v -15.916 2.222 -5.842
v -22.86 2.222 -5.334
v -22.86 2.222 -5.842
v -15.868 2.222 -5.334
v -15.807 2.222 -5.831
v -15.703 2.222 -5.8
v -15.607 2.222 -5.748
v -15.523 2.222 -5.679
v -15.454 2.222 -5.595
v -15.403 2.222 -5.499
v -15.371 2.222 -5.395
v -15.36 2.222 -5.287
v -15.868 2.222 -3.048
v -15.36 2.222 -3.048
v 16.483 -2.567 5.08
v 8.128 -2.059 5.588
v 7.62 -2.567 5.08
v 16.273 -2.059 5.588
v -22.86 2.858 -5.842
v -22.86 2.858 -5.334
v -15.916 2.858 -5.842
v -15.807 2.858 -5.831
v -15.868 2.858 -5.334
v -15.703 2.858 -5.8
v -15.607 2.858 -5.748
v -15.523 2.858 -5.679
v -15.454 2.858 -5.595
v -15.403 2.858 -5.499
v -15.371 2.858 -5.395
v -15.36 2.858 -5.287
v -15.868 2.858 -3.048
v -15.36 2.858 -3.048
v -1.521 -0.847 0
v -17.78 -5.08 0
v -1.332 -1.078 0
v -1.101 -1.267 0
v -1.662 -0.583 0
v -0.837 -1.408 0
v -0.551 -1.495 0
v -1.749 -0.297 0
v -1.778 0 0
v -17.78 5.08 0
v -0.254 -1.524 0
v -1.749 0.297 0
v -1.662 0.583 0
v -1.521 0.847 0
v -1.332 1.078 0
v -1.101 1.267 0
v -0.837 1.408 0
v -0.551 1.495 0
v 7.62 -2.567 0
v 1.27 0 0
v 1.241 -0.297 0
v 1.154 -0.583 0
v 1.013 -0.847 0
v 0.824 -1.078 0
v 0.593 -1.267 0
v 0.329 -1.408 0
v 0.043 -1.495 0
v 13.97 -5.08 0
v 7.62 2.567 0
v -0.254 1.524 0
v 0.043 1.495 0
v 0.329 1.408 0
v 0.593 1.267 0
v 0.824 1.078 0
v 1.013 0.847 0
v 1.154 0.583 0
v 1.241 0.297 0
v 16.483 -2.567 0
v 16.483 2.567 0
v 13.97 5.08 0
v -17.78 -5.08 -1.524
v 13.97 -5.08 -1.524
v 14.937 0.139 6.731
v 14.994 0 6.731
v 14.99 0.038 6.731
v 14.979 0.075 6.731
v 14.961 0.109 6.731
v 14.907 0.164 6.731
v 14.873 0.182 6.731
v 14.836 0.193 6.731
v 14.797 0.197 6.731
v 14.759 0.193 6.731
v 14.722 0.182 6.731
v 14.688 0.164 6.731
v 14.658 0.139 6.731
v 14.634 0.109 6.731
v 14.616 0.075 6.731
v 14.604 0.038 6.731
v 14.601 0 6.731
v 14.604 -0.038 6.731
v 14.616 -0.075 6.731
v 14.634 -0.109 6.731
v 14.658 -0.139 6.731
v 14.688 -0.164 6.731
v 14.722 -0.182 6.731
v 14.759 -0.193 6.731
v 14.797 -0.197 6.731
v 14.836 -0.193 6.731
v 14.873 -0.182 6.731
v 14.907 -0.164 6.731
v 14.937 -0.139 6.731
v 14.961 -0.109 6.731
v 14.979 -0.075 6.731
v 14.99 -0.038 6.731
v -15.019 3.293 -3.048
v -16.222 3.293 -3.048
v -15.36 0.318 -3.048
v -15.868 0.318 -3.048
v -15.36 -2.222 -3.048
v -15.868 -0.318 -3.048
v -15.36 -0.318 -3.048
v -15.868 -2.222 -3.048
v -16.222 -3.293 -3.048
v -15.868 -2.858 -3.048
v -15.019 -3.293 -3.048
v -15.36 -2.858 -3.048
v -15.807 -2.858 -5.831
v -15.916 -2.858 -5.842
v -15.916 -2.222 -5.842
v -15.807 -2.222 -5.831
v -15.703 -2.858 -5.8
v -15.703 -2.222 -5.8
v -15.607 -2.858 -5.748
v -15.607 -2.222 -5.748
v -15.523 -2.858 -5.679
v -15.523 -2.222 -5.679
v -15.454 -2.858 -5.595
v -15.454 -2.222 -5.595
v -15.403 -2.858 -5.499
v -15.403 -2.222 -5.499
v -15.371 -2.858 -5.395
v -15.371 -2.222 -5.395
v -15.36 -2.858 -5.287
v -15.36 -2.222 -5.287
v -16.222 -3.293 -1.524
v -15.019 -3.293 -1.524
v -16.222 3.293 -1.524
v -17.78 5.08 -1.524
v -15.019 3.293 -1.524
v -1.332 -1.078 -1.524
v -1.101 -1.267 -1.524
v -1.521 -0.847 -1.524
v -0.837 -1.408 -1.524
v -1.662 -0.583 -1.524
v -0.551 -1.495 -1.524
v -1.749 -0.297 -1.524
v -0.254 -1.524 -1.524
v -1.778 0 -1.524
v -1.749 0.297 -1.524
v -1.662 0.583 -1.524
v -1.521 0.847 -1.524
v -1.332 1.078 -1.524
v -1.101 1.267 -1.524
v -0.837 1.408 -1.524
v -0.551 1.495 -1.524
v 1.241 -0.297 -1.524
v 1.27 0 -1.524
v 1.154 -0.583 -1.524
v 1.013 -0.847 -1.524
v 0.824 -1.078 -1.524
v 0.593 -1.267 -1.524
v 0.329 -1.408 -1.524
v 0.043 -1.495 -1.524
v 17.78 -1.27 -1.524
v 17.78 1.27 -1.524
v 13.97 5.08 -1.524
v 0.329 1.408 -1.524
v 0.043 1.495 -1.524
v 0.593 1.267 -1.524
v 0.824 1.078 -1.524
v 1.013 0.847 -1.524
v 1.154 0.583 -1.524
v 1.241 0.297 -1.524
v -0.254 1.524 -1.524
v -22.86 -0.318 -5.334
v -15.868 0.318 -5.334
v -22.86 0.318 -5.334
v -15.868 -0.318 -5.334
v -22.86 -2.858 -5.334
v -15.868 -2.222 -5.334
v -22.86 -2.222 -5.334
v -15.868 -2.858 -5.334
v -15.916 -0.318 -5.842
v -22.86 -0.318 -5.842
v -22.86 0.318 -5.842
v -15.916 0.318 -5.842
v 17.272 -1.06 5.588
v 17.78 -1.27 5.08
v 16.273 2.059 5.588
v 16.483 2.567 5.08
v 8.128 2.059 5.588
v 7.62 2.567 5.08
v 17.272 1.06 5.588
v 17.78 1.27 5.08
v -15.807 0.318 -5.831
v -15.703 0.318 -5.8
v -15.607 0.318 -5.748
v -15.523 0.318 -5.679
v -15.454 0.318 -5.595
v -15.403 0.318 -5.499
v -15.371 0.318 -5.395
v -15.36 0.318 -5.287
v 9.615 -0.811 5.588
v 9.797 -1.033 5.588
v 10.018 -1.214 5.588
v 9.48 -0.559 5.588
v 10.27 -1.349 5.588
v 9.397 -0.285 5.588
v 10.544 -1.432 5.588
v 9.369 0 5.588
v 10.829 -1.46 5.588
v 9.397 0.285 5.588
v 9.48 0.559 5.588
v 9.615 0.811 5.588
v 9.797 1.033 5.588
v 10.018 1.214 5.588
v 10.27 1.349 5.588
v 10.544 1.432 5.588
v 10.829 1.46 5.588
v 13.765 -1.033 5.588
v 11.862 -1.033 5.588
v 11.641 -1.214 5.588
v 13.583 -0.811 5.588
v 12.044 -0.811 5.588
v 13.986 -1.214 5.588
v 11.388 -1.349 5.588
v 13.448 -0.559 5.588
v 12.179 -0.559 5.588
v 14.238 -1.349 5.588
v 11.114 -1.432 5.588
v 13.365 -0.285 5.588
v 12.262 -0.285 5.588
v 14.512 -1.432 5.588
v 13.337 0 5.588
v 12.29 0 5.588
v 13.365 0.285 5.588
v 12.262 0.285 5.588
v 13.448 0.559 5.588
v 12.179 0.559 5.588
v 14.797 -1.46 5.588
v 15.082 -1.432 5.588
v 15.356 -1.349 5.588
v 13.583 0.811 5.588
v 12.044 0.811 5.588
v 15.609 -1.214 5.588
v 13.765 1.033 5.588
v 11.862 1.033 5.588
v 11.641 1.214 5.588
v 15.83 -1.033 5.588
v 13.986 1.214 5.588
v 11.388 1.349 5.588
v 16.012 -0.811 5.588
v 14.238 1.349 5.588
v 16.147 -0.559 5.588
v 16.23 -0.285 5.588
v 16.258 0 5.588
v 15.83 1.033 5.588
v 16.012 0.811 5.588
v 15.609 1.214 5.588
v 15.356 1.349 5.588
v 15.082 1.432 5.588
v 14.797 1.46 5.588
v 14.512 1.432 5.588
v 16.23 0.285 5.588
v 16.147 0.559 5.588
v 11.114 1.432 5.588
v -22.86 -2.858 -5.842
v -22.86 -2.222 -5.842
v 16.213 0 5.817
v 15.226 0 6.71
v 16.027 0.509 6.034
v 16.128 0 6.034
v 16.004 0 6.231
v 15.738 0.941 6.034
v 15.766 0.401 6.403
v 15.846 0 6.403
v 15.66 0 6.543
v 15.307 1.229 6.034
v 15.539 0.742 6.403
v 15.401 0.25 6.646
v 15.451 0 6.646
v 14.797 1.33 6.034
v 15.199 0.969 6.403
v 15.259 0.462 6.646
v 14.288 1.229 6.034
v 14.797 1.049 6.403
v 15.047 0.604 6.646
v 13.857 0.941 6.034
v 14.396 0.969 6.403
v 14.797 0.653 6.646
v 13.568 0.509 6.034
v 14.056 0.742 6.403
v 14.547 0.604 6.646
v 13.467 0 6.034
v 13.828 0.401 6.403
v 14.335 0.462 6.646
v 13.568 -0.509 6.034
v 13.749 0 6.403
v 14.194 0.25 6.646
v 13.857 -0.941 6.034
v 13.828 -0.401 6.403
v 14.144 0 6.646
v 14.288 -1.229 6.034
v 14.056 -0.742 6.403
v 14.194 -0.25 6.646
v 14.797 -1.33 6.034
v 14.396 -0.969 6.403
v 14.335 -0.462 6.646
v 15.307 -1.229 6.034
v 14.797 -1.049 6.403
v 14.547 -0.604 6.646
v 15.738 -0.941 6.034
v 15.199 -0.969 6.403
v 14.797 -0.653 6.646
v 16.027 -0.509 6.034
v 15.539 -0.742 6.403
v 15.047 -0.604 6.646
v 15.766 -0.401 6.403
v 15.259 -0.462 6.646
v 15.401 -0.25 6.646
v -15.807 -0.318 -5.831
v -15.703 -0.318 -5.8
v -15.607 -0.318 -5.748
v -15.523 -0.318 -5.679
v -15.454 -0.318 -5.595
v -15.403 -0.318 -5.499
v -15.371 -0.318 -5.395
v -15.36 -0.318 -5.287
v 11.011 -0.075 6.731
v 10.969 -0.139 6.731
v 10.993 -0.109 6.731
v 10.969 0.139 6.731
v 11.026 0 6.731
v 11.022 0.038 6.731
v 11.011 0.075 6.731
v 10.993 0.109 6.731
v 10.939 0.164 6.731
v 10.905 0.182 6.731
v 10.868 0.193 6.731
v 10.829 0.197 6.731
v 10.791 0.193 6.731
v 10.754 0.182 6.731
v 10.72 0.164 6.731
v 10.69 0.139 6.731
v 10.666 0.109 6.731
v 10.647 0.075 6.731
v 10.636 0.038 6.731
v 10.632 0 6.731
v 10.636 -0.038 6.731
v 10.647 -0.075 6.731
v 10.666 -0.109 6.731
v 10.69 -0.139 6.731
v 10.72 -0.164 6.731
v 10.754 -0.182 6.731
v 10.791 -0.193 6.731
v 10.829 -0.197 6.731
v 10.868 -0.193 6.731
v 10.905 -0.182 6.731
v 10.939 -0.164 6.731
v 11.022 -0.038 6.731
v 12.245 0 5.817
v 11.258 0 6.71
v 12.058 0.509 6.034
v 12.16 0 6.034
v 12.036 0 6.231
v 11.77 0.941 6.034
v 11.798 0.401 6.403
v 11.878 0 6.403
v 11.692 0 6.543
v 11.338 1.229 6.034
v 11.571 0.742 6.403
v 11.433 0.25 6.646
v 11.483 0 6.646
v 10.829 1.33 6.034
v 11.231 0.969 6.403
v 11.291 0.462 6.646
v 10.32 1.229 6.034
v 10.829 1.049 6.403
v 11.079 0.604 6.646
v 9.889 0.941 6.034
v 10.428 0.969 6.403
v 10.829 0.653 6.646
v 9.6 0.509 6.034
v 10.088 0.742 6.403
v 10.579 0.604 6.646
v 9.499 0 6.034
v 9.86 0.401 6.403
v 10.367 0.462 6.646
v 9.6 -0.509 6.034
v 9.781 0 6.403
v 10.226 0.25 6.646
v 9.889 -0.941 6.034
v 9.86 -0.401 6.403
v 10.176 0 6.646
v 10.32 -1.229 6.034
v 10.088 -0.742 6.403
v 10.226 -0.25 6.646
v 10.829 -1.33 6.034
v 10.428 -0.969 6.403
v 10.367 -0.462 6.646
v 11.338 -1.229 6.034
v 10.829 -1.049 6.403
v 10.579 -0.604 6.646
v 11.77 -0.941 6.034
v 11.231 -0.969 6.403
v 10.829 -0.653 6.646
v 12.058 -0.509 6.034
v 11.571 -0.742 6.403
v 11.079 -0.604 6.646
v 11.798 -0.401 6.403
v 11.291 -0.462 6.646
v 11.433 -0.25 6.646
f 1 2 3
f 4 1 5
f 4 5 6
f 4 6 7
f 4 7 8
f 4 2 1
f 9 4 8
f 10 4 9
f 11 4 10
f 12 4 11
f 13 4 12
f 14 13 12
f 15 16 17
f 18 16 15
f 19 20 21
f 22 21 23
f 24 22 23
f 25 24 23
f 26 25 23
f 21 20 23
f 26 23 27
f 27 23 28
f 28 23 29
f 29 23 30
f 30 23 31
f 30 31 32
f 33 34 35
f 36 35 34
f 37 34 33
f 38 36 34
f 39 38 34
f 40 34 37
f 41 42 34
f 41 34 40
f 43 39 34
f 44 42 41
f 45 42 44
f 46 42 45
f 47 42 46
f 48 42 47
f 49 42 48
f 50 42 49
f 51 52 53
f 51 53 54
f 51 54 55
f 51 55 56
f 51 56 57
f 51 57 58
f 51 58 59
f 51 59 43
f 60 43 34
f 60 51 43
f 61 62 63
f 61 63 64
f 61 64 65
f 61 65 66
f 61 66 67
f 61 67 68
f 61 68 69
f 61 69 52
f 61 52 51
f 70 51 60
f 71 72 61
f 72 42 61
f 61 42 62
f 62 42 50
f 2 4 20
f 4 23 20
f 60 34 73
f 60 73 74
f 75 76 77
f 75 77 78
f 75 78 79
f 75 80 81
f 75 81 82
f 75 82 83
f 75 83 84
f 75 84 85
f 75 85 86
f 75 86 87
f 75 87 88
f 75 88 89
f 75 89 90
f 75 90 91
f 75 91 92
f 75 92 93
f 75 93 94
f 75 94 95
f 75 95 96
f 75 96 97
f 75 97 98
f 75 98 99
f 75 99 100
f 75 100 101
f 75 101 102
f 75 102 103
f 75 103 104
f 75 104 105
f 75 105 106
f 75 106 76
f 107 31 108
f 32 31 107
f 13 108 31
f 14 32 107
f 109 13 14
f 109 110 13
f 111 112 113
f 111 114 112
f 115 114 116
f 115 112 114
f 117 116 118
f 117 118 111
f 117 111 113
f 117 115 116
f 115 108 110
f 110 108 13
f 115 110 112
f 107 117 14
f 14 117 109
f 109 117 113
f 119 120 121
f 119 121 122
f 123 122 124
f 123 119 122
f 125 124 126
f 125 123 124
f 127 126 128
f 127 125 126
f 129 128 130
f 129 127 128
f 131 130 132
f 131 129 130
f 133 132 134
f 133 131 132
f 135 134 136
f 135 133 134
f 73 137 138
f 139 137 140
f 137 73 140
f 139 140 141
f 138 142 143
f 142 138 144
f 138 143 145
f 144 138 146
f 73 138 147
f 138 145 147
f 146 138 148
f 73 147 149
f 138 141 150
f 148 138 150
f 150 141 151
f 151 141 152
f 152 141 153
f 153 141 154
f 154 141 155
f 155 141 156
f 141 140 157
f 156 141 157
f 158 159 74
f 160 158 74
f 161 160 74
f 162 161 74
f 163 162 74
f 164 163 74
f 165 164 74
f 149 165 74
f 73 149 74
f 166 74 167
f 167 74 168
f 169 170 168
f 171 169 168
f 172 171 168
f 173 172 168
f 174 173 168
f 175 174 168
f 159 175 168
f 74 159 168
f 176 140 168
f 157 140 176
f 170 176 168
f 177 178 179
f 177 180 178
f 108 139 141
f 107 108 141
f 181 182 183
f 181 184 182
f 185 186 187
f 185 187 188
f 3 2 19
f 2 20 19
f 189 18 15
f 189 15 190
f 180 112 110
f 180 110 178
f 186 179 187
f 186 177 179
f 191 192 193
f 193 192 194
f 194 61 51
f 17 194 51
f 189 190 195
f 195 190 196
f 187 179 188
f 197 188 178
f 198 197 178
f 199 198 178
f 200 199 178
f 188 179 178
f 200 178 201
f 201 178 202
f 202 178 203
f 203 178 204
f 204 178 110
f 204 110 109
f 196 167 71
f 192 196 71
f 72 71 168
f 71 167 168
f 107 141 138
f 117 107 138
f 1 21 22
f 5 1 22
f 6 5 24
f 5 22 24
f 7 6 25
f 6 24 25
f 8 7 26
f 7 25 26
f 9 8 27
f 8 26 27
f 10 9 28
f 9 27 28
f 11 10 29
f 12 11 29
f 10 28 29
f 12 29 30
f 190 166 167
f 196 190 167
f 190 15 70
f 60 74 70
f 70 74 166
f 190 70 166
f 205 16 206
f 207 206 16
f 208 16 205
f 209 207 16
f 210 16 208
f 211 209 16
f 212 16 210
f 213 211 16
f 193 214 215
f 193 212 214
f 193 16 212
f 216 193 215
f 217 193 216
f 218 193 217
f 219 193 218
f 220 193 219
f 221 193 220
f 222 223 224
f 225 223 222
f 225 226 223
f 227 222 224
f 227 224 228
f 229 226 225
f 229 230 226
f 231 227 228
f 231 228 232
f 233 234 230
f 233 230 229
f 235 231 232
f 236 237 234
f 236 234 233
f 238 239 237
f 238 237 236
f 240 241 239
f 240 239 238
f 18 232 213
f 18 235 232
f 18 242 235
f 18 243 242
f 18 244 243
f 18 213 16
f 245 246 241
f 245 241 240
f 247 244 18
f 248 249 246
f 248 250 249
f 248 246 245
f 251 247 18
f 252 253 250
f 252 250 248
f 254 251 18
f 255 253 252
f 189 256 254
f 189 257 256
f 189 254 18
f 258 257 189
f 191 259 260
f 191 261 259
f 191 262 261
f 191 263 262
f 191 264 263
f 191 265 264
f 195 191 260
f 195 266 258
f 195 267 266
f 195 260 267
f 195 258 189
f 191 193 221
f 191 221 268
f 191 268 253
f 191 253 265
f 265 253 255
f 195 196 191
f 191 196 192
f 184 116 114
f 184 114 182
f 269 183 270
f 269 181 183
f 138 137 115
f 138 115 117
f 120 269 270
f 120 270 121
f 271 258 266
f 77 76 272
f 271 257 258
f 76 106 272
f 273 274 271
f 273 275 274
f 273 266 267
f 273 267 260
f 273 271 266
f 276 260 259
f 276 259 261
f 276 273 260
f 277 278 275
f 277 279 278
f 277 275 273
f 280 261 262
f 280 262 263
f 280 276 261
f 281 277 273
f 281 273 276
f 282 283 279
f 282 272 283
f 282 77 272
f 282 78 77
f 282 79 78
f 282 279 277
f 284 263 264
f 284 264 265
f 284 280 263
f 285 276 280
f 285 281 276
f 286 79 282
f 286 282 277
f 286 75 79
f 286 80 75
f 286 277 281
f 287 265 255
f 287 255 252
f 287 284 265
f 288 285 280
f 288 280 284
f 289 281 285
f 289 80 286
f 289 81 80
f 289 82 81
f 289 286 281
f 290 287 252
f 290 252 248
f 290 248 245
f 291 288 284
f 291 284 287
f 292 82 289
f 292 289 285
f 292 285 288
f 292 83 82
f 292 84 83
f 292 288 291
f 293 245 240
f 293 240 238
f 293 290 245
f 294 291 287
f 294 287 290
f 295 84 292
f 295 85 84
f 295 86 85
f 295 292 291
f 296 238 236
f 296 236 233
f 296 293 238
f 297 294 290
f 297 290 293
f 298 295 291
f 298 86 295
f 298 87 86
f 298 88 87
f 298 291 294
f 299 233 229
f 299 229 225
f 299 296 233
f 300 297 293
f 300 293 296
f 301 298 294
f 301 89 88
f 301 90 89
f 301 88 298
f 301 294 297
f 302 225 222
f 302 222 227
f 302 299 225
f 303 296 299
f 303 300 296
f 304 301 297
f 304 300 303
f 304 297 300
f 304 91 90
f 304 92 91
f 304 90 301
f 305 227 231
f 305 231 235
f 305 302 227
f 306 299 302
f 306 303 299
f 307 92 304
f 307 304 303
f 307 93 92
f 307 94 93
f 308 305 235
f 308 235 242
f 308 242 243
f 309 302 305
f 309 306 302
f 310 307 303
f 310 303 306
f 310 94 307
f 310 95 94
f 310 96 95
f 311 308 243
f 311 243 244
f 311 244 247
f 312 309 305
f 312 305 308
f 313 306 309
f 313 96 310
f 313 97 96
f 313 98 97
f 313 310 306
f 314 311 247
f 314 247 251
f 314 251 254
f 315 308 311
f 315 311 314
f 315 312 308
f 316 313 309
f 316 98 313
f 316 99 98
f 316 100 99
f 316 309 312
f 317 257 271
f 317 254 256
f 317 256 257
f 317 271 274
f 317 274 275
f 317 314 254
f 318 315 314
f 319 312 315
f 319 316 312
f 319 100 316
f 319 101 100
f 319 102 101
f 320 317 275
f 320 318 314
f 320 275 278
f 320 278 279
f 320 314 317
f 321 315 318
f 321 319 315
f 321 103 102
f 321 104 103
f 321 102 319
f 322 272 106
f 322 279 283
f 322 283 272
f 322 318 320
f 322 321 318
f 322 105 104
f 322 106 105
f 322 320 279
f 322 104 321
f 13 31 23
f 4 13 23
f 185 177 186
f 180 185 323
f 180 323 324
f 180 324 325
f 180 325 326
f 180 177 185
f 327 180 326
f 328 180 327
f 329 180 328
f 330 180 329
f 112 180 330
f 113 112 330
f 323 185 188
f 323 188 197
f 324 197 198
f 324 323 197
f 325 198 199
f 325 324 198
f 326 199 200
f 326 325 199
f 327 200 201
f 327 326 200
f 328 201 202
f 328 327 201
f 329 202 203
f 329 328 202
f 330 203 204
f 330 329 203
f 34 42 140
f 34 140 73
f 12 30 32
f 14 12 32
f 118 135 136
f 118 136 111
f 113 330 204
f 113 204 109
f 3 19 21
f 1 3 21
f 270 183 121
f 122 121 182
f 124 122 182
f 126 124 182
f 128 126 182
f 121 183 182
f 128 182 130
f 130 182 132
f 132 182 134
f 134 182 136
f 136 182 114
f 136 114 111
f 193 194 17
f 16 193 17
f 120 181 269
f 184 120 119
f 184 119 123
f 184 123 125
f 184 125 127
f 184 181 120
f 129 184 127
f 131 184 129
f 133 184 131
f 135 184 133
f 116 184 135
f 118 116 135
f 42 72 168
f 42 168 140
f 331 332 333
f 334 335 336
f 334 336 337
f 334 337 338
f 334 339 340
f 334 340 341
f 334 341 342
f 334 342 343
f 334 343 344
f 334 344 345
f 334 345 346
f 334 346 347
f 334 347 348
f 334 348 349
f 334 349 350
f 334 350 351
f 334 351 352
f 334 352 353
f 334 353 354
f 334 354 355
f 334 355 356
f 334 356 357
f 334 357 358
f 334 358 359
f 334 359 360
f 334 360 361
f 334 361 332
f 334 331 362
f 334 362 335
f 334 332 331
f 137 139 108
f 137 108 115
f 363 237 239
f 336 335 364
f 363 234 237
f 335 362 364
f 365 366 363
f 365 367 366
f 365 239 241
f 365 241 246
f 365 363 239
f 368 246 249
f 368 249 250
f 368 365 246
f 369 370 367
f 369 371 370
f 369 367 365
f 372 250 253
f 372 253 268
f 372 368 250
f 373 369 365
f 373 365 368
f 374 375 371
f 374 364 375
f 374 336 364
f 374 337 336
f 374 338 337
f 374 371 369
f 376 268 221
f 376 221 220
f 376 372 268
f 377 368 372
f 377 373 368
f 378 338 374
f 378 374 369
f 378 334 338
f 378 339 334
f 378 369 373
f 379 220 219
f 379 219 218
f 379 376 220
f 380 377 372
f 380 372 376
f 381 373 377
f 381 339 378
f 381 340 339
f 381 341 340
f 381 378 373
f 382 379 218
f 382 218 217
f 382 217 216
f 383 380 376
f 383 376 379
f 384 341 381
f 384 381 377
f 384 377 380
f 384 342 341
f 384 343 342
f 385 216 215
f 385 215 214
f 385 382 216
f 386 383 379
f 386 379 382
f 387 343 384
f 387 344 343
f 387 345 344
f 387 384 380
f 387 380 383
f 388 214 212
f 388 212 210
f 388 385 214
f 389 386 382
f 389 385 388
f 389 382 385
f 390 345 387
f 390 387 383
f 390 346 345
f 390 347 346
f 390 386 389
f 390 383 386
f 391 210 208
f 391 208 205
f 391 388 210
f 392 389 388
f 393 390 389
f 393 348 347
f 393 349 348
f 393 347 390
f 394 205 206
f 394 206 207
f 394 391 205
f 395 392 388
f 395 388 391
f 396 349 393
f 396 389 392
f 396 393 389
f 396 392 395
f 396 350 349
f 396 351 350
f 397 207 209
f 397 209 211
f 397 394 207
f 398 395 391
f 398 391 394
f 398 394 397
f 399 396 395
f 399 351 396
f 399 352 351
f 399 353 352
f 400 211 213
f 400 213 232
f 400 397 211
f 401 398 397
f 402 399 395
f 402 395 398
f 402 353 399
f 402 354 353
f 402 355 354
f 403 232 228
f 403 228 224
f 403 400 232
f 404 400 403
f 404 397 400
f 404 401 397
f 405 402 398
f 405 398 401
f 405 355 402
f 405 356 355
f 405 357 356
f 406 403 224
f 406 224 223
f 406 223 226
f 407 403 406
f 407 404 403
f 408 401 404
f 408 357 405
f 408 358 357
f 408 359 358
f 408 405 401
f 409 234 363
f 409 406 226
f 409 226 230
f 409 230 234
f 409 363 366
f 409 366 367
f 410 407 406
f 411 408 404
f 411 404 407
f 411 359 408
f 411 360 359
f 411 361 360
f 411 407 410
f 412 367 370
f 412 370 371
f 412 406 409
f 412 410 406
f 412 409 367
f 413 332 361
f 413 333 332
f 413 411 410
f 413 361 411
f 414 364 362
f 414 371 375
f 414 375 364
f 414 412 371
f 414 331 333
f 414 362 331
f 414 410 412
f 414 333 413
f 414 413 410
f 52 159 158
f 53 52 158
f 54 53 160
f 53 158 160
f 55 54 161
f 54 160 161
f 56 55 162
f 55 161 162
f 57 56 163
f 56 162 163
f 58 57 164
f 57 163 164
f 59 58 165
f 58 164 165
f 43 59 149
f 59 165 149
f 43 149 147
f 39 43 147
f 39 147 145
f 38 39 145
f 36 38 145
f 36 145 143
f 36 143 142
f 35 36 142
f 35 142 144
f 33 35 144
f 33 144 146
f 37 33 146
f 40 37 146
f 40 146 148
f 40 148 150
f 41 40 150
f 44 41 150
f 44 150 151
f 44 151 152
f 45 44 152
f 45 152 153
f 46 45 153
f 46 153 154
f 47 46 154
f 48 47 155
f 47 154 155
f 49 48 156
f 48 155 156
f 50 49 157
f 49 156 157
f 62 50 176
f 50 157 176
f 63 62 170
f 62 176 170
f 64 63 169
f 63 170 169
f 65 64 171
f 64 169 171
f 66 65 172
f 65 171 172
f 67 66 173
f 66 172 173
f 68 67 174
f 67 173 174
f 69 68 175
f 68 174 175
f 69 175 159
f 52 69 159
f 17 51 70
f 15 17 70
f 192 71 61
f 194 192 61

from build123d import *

# Parameters (mm, degrees)
F1_DEPTH  = 1.524
F3_DEPTH  = 5.588
F4_R      = 1.4605
F5_DEPTH  = 1.143
F7_SIZE   = 0.508
F9_DEPTH  = 0.3175
F12_W     = 1.2032650411
F12_H     = 6.585133262
F12_W_2   = 0.508
F12_H_2   = 0.635
F13_DEPTH = 1.524
F14_R     = 1.524
F15_DEPTH = 25.4


# Not quite as in the source:
# - a fillet or chamfer that OpenCascade refuses, or shapes differently, is made with other operations: its cross-section is extruded or revolved along the edge and cut away or added


with BuildPart() as f1:
    # F0 (on Top) → F1 (new body)
    with BuildSketch(Plane.XY):
        Polygon((-17.78, -5.08), (13.97, -5.08), (16.4832153797, -2.5667846203), (7.62, -2.5667846203), (7.62, 2.5667846203), (16.4832153797, 2.5667846203), (13.97, 5.08), (-17.78, 5.08), align=None)
        Polygon((7.62, -2.5667846203), (16.4832153797, -2.5667846203), (17.78, -1.27), (17.78, 1.27), (16.4832153797, 2.5667846203), (7.62, 2.5667846203), align=None)
    extrude(amount=-F1_DEPTH)

    # F2 (on face) → F3 (join)
    with BuildSketch(Plane.XY):
        Polygon((16.4832153797, -2.5667846203), (17.78, -1.27), (17.78, 1.27), (16.4832153797, 2.5667846203), (7.62, 2.5667846203), (7.62, -2.5667846203), align=None)
    extrude(amount=F3_DEPTH)

    # F4 (on face) → F5 (join)
    with BuildSketch(Plane.XY.offset(5.588)):
        with Locations((10.829353705, 0)):
            Circle(F4_R)
        with Locations((14.7973923013, 0)):
            Circle(F4_R)
    extrude(amount=F5_DEPTH)

    # F6: fillet of radius 1.27 on 2 edges, made by hand

    # F6_s1 → F6_t2 (revolve, cut)
    with BuildSketch(Plane.XZ):
        with BuildLine():
            ThreePointArc((12.289853705, 5.588), (11.8781615594, 6.4028572079), (11.0262196599, 6.731))
            Line((11.0262196599, 6.731), (12.289853705, 6.731))
            Line((12.289853705, 6.731), (12.289853705, 5.588))
        make_face()
    revolve(axis=Axis((10.829353705, 0, 6.731), (0, 0, 1)), mode=Mode.SUBTRACT)

    # F6_s3 → F6_t4 (revolve, cut)
    with BuildSketch(Plane.XZ):
        with BuildLine():
            ThreePointArc((16.2578923013, 5.588), (15.8462001556, 6.4028572079), (14.9942582561, 6.731))
            Line((14.9942582561, 6.731), (16.2578923013, 6.731))
            Line((16.2578923013, 6.731), (16.2578923013, 5.588))
        make_face()
    revolve(axis=Axis((14.7973923013, 0, 6.731), (0, 0, 1)), mode=Mode.SUBTRACT)

    # F7
    f7_edges = [f1.edges().sort_by_distance(p)[0] for p in [
        (12.051608, -2.566785, 5.588),
        (12.051608, 2.566785, 5.588),
        (7.62, 0, 5.588),
        (17.78, 0, 5.588),
        (17.131608, -1.918392, 5.588),
        (17.131608, 1.918392, 5.588),
    ]]
    chamfer(f7_edges, length=F7_SIZE)

    # F11: F10_1 across plane


with BuildPart() as f9:
    # F8 (on Front) → F9 (new body, symmetric)
    with BuildSketch(Plane.XZ):
        with BuildLine():
            Line((-22.86, -5.334), (-22.86, -5.842))
            Line((-22.86, -5.842), (-15.9157037269, -5.842))
            ThreePointArc((-15.9157037269, -5.842), (-15.5230394847, -5.6793531454), (-15.3603926301, -5.2866889032))
            Line((-15.3603926301, -5.2866889032), (-15.3603926301, -1.1672781548))
            Line((-15.3603926301, -1.1672781548), (-15.8683926301, -1.1672781548))
            Line((-15.8683926301, -1.1672781548), (-15.8683926301, -5.334))
            Line((-15.8683926301, -5.334), (-22.86, -5.334))
        make_face()
    extrude(amount=F9_DEPTH, both=True)


with BuildPart() as f10_1:
    # F10: copy of F9
    add(f9.part.moved(Location((0, -2.54, 0))))


with BuildPart() as f1_1:
    add(f1.part)
    add(f10_1.part.mirror(Plane.XZ))


    add(f9.part)  # F13 merges F9

    add(f10_1.part)  # F13 merges F10_1
    # F12 (on face) → F13 (join)
    with BuildSketch(Plane(origin=(0, 0, -1.524), x_dir=(1, 0, 0), z_dir=(0, 0, -1))):
        with Locations((-15.6205464154, 0)):
            Rectangle(F12_W, F12_H)
        with Locations((-15.6143926301, -2.54)):
            Rectangle(F12_W_2, F12_H_2, mode=Mode.SUBTRACT)
    extrude(amount=F13_DEPTH)

    # F14 (on face) → F15 (cut)
    with BuildSketch(Plane(origin=(0, 0, -1.524), x_dir=(1, 0, 0), z_dir=(0, 0, -1))):
        with Locations((-0.254, 0)):
            Circle(F14_R)
    extrude(amount=-F15_DEPTH, mode=Mode.SUBTRACT)


solid = f1_1.part
